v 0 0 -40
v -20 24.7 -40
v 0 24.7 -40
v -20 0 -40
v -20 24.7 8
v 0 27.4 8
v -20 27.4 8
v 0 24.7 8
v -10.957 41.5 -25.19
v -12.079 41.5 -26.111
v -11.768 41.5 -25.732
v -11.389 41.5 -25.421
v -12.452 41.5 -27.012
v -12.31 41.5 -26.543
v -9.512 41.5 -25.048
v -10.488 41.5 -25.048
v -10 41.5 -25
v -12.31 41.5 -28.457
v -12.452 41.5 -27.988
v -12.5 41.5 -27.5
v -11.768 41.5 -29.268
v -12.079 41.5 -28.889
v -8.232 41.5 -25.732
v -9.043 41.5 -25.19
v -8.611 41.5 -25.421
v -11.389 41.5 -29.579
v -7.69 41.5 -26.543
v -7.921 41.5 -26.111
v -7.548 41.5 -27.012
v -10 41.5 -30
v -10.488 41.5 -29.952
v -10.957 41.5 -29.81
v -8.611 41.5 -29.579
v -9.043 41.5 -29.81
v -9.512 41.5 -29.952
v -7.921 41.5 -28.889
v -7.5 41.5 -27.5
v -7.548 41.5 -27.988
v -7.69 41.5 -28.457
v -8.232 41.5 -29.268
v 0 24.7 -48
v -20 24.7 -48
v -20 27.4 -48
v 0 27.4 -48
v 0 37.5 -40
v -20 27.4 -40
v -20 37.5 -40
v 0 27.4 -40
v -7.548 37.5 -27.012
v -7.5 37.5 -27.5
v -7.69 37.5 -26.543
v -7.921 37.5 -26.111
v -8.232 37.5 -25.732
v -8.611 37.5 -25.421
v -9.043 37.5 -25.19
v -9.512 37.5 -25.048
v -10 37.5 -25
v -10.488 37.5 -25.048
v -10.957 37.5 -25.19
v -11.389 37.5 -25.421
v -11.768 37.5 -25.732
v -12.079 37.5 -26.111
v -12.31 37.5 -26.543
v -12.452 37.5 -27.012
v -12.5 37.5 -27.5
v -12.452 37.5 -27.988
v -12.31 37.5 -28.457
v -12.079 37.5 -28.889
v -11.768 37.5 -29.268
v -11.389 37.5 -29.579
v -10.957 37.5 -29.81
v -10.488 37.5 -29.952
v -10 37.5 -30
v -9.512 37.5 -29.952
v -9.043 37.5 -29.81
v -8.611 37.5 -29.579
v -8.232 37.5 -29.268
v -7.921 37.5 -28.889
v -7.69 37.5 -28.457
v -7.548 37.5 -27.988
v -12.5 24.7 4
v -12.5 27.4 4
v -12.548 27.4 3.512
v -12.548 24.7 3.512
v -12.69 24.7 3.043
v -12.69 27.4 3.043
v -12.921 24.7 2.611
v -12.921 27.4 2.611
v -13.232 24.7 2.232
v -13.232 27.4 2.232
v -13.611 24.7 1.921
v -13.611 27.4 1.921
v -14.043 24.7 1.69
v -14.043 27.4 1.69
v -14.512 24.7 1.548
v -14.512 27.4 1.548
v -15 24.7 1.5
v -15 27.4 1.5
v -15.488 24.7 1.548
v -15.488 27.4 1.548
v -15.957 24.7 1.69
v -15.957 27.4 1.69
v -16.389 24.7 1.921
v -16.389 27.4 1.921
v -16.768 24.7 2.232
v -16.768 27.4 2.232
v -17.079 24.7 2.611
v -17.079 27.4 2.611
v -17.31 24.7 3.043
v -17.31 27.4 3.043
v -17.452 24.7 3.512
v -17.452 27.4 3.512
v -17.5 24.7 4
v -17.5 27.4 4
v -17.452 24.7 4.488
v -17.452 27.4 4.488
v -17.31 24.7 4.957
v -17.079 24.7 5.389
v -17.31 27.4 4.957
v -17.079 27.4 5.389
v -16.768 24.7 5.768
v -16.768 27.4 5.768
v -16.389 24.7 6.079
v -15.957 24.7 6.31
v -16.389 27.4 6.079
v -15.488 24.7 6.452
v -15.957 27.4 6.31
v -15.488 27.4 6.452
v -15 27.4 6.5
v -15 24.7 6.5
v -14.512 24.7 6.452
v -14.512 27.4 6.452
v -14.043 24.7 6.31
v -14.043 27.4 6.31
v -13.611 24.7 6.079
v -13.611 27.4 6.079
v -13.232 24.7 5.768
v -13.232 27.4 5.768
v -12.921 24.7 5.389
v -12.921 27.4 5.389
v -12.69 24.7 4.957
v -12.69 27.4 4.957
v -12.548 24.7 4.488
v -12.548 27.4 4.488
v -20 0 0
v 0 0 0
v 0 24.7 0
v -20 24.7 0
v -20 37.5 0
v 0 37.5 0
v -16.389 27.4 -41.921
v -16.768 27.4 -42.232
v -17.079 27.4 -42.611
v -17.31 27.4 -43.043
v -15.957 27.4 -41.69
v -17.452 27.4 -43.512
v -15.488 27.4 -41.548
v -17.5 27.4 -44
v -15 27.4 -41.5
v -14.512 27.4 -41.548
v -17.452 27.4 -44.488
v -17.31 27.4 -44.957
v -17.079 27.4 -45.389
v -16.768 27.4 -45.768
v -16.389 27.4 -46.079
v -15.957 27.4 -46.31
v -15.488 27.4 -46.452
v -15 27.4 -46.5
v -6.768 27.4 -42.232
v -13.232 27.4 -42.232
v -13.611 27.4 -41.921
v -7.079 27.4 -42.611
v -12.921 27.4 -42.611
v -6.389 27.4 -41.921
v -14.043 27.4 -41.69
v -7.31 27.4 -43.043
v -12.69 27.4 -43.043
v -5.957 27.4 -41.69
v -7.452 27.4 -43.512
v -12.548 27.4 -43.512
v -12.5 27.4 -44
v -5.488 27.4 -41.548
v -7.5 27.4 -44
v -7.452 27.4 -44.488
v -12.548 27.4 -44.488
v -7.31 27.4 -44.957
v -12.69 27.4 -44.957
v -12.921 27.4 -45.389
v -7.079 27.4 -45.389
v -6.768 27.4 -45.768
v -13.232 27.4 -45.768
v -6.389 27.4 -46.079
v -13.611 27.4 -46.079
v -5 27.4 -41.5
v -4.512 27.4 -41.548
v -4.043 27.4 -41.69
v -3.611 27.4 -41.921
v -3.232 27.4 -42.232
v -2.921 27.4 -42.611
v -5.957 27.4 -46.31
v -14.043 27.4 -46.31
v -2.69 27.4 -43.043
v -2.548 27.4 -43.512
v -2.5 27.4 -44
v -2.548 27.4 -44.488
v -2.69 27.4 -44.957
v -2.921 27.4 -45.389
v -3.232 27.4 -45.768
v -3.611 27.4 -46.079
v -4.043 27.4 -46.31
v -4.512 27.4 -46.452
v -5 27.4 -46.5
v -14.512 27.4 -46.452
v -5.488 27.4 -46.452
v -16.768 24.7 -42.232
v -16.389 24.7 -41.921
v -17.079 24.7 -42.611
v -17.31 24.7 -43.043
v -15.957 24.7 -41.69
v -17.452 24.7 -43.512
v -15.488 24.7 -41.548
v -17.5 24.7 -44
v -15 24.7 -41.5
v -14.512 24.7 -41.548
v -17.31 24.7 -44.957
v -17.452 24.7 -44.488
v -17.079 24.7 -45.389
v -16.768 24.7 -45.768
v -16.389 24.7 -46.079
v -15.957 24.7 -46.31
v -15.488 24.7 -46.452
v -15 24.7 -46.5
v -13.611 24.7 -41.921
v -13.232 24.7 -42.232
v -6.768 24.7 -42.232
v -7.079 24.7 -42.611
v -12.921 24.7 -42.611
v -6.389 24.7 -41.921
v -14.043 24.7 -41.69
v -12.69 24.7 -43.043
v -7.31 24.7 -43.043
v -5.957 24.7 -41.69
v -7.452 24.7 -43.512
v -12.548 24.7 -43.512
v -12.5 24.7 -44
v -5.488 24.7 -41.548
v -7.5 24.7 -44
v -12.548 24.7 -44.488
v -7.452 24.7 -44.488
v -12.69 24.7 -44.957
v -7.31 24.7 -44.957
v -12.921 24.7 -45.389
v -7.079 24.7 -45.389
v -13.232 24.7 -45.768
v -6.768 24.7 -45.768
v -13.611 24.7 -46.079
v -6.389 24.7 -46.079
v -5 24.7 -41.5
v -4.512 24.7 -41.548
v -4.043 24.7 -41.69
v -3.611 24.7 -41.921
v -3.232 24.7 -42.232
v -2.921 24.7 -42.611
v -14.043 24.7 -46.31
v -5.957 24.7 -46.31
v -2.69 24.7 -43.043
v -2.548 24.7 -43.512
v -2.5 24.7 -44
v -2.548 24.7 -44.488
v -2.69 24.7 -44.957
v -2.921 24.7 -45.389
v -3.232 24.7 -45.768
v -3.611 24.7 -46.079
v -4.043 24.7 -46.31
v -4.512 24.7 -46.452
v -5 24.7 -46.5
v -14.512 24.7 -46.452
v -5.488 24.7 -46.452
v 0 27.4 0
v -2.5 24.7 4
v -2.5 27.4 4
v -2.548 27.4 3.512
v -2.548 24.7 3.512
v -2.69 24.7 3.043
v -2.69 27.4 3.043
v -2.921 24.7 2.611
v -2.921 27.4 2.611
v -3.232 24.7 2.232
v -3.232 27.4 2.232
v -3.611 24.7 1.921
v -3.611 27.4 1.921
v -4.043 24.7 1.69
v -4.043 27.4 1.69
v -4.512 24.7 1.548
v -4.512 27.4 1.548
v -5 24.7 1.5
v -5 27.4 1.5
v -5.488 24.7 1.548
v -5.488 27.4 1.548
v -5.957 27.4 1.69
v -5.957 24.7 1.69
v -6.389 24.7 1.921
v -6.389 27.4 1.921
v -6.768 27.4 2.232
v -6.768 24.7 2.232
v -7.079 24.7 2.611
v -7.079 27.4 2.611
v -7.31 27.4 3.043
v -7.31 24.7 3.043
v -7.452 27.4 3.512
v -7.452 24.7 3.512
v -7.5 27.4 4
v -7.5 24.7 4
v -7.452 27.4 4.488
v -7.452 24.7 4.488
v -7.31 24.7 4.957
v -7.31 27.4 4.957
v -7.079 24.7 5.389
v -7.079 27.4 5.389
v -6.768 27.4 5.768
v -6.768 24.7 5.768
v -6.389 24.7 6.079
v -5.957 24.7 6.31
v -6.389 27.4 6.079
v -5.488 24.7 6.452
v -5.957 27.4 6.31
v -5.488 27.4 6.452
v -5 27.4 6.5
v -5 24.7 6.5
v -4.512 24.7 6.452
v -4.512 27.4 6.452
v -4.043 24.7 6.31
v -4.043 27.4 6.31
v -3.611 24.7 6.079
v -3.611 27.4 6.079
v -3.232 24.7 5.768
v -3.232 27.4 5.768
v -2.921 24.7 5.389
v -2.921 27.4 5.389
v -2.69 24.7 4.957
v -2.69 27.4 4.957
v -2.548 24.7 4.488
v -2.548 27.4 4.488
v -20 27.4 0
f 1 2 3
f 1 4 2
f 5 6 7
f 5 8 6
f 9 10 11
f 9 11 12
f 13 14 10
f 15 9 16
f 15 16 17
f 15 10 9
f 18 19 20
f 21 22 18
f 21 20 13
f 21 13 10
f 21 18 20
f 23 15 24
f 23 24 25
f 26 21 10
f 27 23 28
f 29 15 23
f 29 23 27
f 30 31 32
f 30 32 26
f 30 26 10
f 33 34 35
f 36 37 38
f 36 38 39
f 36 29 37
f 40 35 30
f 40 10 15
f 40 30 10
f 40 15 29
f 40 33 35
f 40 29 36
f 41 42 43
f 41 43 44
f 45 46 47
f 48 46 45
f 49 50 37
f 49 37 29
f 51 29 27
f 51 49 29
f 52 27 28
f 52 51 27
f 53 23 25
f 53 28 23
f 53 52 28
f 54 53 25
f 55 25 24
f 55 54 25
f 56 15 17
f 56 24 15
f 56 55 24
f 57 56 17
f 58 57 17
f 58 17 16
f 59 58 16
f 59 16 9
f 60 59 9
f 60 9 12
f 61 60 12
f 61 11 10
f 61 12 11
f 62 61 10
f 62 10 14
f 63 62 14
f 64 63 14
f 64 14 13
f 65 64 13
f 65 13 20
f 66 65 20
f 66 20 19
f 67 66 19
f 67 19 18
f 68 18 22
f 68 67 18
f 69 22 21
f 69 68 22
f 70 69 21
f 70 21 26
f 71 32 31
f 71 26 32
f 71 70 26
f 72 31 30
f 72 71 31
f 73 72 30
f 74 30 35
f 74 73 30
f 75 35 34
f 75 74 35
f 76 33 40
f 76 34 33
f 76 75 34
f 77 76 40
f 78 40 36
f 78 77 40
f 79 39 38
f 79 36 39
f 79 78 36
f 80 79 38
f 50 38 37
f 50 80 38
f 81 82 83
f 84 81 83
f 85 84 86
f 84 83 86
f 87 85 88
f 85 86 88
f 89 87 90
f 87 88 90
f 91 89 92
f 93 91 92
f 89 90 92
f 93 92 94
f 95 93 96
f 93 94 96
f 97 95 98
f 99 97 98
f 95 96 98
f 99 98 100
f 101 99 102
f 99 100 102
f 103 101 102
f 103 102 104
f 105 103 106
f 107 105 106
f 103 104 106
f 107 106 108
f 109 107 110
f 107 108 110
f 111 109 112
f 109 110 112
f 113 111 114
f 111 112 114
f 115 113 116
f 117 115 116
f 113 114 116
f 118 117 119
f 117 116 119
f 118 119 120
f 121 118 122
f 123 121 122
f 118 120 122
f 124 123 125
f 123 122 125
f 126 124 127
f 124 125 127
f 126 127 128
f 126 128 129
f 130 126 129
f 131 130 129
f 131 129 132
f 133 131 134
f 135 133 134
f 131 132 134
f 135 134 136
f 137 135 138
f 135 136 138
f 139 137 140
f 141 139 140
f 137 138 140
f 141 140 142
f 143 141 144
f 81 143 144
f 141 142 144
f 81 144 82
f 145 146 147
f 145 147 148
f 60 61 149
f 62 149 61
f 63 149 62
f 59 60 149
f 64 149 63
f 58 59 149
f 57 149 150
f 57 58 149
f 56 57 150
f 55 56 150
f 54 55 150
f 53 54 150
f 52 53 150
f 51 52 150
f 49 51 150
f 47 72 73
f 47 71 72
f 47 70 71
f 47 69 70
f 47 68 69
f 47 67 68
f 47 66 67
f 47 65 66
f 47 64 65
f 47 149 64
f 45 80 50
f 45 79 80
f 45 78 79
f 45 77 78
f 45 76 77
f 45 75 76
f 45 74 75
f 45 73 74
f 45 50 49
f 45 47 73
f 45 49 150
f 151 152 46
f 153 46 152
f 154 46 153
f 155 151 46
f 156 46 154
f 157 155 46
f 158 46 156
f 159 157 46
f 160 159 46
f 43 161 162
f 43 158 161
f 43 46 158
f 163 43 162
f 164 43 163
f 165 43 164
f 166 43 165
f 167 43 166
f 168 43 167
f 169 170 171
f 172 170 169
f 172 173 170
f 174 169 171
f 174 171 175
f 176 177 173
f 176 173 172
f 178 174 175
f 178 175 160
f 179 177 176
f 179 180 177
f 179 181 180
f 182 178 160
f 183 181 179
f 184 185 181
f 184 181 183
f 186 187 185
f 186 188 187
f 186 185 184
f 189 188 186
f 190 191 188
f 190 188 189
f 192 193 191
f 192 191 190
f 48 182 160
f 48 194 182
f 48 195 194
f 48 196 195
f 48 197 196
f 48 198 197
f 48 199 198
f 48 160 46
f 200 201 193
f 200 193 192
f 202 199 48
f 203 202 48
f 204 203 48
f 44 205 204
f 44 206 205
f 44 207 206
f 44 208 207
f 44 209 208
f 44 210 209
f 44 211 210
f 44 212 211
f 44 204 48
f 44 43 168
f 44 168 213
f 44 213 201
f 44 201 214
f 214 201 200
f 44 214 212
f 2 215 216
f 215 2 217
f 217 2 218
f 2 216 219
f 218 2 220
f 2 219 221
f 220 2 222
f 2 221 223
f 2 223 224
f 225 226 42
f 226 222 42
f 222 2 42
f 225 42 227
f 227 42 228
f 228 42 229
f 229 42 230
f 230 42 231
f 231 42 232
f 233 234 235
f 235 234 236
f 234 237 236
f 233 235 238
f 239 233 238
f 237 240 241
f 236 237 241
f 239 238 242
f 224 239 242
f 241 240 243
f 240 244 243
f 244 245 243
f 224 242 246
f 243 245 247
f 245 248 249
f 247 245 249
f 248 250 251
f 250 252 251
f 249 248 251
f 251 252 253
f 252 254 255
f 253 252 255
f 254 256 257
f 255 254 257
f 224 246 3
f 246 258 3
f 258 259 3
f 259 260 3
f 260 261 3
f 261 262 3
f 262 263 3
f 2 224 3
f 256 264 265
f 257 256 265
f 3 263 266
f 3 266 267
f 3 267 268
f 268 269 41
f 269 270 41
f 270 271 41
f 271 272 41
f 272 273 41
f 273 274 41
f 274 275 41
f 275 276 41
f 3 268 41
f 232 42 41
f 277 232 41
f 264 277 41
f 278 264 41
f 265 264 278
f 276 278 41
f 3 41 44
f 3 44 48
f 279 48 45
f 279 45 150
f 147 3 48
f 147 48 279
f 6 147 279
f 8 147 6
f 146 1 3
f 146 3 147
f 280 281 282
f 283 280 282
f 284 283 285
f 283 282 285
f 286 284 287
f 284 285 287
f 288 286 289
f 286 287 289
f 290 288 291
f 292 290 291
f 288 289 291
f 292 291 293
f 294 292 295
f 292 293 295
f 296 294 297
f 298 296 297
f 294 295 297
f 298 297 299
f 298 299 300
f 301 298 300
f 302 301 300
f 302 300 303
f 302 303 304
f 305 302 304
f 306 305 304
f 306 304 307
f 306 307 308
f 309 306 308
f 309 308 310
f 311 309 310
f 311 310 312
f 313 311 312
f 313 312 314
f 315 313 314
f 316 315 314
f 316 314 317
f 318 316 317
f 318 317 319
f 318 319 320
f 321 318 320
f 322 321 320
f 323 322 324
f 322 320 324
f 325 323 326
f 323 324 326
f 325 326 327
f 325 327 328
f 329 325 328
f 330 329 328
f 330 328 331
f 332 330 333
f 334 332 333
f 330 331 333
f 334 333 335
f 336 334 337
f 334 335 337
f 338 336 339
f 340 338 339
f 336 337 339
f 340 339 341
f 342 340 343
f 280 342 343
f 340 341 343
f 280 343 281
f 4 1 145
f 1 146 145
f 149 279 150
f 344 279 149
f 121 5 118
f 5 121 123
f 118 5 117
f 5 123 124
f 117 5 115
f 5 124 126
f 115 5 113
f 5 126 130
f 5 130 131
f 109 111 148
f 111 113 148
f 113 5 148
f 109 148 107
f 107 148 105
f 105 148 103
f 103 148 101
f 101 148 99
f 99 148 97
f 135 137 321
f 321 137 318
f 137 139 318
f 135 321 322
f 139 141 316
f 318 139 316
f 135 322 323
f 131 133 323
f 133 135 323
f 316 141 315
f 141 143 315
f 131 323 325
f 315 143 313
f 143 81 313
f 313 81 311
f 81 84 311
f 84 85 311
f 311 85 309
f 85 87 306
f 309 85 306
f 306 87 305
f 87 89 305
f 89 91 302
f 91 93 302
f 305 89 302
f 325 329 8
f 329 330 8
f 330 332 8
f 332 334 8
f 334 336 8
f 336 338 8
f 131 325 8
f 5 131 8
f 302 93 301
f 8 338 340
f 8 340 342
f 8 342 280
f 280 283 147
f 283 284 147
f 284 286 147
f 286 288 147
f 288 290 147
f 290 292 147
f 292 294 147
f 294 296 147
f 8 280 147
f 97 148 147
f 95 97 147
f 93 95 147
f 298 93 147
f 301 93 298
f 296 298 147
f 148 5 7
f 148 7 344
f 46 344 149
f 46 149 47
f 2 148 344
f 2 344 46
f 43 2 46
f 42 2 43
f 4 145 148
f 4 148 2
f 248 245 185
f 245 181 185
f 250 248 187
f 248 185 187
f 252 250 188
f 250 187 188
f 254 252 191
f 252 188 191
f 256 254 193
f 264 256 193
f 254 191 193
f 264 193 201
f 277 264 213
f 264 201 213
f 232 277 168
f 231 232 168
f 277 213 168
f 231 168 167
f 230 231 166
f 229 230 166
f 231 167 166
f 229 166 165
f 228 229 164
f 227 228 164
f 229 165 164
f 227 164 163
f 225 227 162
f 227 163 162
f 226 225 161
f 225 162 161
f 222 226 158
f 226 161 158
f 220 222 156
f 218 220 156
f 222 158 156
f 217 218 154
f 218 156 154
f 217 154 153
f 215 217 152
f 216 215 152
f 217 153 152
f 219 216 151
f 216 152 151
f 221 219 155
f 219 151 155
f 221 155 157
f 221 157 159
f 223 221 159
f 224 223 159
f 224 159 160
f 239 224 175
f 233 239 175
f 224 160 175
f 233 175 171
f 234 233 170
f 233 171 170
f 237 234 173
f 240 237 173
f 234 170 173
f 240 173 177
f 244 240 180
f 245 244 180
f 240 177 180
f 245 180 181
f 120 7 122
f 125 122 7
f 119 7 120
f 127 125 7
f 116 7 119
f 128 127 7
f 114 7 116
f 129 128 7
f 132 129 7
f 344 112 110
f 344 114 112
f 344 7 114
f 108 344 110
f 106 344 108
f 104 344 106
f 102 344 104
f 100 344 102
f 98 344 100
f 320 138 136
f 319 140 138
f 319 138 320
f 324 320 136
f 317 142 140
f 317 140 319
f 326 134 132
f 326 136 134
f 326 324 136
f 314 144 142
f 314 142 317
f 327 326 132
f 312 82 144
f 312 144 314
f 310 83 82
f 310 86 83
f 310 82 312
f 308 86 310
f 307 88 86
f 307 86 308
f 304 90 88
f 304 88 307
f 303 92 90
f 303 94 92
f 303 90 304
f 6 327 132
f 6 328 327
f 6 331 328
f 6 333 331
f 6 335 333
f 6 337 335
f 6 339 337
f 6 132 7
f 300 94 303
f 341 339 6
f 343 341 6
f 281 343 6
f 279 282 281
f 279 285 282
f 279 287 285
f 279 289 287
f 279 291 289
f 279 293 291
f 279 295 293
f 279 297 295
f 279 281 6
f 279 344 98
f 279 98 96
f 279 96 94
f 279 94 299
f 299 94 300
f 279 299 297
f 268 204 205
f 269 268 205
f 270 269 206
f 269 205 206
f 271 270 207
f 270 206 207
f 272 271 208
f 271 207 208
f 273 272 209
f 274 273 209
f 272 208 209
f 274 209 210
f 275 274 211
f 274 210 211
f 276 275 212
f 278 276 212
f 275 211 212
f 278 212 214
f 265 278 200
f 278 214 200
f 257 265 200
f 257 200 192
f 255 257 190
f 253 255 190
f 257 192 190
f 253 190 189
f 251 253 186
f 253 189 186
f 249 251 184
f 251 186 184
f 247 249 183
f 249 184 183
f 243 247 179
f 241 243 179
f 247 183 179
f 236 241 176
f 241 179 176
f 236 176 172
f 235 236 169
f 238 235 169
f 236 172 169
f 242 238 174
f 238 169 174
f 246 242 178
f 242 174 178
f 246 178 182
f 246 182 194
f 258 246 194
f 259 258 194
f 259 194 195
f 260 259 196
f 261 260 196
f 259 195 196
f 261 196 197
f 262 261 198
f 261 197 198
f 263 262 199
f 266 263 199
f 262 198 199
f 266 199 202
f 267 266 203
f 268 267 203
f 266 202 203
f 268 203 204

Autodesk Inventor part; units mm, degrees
ref_plane "YZ Plane" through (0, 0, 0) normal (1, 0, 0) x (0, 1, 0)
ref_plane "XZ Plane" through (0, 0, 0) normal (0, 1, 0) x (-1, 0, 0)
ref_plane "XY Plane" through (0, 0, 0) normal (0, 0, 1) x (1, 0, 0)
sketch "Sketch1" plane through (0, 0, 0) normal (0, 1, 0) x (-1, 0, 0)
  line L0 (0, 0) -> (20, 0)
  line L1 (20, 0) -> (20, -40)
  line L2 (20, -40) -> (0, -40)
  line L3 (0, -40) -> (0, 0)
  dimension "d0" = 40
  dimension "d1" = 20
extrude "Extrusion1" add sketch "Sketch1" along normal blind 24.7
sketch "Sketch2" plane through (0, 24.7, 0) normal (0, 1, 0) x (1, 0, 0)
  line L0 (0, -8) -> (-20, -8)
  line L1 (-20, -8) -> (-20, 48)
  line L2 (-20, 48) -> (0, 48)
  line L3 (0, 48) -> (0, -8)
  line L4 (-20, 40) -> (-20, 0) projected
  line L5 (-20, 0) -> (0, 0) projected
  dimension "d4" = 56
  dimension "d5" = 20
  dimension "d6" = 0
  dimension "d7" = 8
extrude "Extrusion2" add sketch "Sketch2" along normal blind 2.7
sketch "Sketch3" plane through (0, 27.4, 0) normal (0, 1, 0) x (1, 0, 0)
  line L0 (-20, 48) -> (-20, 40) projected
  line L1 (0, 0) -> (-20, 0)
  line L2 (-20, 0) -> (-20, 40)
  line L3 (-20, 40) -> (0, 40)
  line L4 (0, 40) -> (0, 0)
extrude "Extrusion3" add sketch "Sketch3" along normal blind 10.1
sketch "Sketch4" plane through (0, 37.5, 0) normal (0, 1, 0) x (1, 0, 0)
  circle A0 centre (-10, 27.5) radius 2.5
  line L0 (0, 40) -> (-20, 40) projected
  line L1 (0, 0) -> (0, 40) projected
  dimension "d12" = 12.5
  dimension "d13" = 5
  dimension "d16" = 10
extrude "Extrusion4" add sketch "Sketch4" along normal blind 4
sketch "Sketch5" plane through (0, 27.4, 0) normal (0, 1, 0) x (1, 0, 0)
  circle A0 centre (-5, -4) radius 2.5
  circle A1 centre (-15, -4) radius 2.5
  line L0 (-20, 0) -> (-20, -8) projected
  line L1 (0, -8) -> (0, 0) projected
  line L2 (-20, -8) -> (0, -8) projected
  line L3 (17.0621, 20) -> (-50.3662, 20) construction
  line L4 (-20, 0) -> (0, 0) projected
  circle A2 centre (-5, 44) radius 2.5
  circle A3 centre (-15, 44) radius 2.5
  dimension "d17" = 5
  dimension "d18" = 5
  dimension "d19" = 5
  dimension "d20" = 4
  dimension "d21" = 4
  dimension "d22" = 20
extrude "Extrusion5" cut sketch "Sketch5" against normal blind 4 contours A0 | A1 | A2 | A3
equation "\"d21\" = d20"
properties part number "motor"
